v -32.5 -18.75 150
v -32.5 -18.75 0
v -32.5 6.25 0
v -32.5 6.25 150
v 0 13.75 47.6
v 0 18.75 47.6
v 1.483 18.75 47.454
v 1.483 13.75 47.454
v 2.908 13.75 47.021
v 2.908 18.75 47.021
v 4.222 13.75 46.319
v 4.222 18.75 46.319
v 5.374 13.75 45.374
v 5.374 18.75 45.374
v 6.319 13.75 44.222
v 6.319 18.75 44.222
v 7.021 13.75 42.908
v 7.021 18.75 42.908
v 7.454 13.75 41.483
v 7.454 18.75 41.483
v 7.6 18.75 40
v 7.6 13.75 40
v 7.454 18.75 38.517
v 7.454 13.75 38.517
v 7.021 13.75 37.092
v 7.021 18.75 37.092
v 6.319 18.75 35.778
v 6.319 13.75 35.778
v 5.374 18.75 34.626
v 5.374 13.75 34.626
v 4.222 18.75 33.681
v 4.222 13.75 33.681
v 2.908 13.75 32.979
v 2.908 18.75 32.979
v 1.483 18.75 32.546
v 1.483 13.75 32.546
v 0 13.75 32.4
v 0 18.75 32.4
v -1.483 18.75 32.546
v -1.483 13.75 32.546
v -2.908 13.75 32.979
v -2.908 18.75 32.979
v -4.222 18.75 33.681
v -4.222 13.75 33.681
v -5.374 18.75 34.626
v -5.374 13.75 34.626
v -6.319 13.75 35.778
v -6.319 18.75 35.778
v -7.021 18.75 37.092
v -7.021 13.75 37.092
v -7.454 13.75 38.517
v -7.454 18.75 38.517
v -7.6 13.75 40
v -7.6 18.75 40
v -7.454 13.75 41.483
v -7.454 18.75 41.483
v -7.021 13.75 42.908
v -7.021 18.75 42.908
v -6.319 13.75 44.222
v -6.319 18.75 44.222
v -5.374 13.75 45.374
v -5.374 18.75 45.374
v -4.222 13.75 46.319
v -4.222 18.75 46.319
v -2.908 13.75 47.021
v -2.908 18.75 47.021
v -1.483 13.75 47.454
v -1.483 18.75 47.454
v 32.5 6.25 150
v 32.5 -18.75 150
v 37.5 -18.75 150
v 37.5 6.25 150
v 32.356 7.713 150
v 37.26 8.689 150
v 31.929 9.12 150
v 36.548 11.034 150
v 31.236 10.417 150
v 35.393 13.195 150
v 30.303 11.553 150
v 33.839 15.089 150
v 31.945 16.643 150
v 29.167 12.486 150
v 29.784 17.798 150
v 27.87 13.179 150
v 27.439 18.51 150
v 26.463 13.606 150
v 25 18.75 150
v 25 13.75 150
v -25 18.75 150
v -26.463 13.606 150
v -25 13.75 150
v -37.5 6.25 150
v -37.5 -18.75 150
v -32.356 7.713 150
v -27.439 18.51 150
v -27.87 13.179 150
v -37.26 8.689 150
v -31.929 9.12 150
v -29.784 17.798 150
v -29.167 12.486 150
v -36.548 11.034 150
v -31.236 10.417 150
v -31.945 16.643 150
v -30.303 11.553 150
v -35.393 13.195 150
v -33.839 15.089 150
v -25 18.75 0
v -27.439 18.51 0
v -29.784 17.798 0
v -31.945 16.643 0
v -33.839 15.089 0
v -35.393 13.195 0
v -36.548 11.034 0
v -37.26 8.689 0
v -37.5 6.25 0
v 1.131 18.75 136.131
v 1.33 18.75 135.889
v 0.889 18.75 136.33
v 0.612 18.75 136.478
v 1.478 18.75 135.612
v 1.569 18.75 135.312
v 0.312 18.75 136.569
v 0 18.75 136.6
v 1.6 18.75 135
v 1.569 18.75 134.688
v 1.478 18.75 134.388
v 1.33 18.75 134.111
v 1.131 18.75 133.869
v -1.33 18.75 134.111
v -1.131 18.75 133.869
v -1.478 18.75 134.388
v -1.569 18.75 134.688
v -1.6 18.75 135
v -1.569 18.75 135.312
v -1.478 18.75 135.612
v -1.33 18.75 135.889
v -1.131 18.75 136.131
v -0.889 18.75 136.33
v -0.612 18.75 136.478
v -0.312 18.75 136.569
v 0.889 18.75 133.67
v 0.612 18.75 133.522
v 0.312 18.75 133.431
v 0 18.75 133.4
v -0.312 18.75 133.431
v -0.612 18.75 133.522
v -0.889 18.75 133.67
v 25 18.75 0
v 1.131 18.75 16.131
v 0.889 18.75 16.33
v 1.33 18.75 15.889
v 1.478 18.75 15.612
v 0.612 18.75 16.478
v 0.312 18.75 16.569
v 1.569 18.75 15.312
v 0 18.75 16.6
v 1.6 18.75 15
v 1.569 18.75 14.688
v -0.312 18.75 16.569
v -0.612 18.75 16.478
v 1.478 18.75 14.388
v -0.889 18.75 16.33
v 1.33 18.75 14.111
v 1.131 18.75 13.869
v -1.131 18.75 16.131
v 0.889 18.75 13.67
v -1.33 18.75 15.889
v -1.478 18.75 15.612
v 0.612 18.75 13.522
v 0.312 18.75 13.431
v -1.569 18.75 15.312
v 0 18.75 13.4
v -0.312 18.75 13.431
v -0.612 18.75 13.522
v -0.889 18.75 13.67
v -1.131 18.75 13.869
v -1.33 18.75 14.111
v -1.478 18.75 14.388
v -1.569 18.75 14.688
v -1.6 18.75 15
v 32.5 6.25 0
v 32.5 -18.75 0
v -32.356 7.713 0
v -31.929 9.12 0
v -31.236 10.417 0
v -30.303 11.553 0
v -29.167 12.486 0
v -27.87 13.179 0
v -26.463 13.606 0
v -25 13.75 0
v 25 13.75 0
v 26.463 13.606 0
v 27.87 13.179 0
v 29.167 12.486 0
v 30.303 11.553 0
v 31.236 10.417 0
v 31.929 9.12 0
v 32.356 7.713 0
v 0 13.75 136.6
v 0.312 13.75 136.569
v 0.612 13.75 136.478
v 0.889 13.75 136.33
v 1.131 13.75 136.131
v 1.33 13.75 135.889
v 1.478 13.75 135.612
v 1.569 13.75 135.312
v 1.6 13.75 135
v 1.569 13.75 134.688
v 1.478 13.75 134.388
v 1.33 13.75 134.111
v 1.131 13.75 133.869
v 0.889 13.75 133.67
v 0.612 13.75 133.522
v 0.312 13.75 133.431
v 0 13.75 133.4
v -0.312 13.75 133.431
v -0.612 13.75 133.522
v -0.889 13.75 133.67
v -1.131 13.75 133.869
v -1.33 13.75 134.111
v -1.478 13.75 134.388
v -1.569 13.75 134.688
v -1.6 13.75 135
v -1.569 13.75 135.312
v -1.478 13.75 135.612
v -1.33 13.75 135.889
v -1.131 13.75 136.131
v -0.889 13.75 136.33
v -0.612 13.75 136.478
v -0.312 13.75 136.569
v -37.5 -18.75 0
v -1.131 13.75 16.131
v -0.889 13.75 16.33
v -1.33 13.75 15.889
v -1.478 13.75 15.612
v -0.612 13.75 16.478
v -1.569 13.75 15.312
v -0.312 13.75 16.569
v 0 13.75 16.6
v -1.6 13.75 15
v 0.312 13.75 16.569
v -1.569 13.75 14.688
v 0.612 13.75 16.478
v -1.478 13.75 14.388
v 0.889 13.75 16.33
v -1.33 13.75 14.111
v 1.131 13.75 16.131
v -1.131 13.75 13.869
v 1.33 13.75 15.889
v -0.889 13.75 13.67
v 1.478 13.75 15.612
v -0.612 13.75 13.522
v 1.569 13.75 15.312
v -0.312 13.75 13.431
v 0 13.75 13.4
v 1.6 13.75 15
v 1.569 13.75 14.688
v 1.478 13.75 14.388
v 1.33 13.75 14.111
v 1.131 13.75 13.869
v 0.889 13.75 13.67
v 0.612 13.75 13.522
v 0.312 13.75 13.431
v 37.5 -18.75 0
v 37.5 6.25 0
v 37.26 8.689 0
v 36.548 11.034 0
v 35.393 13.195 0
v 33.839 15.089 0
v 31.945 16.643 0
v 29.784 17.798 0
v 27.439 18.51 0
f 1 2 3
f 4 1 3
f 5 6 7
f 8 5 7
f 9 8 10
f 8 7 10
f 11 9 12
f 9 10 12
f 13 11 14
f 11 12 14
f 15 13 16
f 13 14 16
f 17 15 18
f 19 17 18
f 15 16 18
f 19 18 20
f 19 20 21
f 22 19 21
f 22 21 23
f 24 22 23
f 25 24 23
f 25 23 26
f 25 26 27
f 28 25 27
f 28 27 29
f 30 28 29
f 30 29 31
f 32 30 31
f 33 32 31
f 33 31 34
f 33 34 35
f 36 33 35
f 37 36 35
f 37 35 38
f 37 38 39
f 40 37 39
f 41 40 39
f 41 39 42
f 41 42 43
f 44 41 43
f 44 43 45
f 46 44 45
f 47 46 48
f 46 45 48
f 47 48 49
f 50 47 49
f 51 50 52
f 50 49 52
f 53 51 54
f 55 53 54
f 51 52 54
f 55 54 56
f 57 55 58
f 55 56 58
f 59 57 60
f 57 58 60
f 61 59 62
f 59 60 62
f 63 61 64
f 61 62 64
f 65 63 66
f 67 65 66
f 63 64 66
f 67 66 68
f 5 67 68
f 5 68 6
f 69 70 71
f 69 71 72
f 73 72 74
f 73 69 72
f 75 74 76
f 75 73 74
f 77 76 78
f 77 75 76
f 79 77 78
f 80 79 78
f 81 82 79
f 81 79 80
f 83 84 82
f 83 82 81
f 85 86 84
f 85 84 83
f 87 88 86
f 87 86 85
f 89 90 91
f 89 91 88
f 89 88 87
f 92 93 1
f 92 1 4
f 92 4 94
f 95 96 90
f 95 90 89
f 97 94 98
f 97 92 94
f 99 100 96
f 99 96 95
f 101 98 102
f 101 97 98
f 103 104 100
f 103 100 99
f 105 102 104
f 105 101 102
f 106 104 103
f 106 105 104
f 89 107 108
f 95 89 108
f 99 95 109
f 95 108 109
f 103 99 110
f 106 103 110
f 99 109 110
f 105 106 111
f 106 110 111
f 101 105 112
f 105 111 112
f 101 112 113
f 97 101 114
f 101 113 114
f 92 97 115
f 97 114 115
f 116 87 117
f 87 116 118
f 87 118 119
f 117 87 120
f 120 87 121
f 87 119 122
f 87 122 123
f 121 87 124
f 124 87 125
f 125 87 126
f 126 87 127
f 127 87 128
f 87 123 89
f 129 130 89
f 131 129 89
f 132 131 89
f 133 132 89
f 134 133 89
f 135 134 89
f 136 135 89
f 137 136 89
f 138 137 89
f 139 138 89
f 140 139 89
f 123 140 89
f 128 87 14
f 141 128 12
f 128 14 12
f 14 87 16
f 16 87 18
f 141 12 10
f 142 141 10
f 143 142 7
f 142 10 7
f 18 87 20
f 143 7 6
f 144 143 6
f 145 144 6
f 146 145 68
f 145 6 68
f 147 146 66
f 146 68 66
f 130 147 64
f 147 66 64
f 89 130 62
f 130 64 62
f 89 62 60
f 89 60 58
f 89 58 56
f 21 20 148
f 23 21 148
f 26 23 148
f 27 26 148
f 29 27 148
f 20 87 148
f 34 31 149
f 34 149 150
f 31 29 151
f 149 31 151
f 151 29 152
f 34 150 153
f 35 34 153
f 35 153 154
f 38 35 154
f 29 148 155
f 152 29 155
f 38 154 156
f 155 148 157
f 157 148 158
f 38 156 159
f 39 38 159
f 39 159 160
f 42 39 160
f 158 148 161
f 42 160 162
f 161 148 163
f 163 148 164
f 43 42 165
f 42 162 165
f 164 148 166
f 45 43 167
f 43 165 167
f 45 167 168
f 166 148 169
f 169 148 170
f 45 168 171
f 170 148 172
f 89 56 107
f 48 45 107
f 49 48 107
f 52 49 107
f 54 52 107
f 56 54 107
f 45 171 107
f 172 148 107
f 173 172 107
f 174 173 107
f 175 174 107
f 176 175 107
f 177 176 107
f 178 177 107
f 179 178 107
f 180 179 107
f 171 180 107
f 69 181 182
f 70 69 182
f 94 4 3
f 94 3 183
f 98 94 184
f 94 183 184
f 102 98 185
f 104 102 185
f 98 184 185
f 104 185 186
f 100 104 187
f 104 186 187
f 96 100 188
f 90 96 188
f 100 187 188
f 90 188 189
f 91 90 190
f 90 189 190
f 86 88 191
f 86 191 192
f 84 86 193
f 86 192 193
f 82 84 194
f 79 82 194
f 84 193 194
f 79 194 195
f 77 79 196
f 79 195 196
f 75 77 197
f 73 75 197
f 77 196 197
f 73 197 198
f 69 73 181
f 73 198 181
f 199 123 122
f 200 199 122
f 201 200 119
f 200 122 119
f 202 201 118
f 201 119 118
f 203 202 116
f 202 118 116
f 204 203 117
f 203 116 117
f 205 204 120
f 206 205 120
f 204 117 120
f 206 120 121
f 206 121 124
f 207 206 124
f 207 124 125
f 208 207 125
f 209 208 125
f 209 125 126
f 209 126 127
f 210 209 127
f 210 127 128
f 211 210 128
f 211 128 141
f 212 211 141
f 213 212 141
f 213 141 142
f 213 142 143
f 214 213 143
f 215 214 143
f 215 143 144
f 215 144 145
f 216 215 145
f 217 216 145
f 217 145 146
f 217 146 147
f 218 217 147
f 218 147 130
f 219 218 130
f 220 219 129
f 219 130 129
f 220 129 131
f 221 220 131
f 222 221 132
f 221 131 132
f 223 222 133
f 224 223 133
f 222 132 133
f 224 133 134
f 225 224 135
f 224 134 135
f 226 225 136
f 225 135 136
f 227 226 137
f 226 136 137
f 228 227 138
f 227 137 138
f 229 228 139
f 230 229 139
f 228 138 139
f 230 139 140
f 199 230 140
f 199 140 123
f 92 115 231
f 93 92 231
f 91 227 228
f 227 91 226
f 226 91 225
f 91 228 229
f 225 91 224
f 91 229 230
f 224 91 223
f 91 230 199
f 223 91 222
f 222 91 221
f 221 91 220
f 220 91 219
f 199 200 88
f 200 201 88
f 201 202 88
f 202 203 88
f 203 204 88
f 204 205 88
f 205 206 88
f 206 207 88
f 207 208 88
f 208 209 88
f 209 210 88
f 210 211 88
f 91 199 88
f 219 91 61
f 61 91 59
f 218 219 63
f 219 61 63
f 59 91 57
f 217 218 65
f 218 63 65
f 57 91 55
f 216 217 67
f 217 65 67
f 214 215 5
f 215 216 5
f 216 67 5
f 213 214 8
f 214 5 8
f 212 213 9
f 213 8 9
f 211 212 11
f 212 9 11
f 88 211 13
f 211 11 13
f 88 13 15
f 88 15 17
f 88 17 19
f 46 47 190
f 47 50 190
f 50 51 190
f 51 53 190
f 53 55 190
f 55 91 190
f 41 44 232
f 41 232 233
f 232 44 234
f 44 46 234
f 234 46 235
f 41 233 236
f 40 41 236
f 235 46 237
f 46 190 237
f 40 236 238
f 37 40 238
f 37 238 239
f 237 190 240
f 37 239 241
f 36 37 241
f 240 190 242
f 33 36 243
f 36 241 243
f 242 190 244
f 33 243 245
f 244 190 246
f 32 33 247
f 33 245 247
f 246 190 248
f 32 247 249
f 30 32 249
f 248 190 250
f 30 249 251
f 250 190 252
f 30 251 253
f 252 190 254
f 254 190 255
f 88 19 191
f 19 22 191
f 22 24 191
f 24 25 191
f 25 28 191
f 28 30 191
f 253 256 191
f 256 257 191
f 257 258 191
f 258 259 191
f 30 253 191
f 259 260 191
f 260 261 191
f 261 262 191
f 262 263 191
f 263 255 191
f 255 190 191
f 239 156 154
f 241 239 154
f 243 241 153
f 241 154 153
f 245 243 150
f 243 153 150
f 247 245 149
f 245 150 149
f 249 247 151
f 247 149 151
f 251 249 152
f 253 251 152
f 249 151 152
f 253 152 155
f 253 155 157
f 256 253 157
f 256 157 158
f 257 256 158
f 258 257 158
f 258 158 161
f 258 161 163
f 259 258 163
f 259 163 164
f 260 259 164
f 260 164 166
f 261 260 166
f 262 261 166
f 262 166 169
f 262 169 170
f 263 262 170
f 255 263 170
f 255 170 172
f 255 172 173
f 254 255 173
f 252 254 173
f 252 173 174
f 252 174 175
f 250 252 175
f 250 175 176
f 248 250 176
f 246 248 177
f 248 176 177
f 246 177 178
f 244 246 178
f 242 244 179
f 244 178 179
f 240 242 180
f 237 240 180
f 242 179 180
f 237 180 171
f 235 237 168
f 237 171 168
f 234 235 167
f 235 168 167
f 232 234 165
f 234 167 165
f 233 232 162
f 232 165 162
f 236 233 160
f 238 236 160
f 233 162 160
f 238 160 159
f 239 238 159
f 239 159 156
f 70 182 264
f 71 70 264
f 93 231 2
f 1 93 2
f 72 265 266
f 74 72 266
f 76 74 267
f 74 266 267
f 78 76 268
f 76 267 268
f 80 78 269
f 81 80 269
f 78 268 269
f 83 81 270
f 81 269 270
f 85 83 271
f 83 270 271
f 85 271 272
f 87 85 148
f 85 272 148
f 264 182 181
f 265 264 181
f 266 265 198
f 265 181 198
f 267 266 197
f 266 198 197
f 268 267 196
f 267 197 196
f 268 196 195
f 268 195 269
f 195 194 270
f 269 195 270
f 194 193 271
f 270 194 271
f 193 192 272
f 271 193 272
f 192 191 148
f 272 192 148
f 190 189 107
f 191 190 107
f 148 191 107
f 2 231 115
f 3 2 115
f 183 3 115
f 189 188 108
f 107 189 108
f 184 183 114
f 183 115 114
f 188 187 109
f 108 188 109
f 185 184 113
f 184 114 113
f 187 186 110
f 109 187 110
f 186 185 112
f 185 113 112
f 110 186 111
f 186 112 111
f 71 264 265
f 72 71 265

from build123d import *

# Parameters (mm, degrees)
BOSS_EXTRUDE1_DEPTH = 150
SKETCH2_R           = 1.6
CUT_EXTRUDE1_DEPTH  = 160.099025767
SKETCH4_R           = 7.6
CUT_EXTRUDE2_DEPTH  = 160.099025767


with BuildPart() as part:
    # Sketch1 → Boss-Extrude1 (new body)
    with BuildSketch(Plane(origin=(0, 0, 0), x_dir=(0, 1, 0), z_dir=(0, 0, 1))):
        with BuildLine():
            Line((-18.75, 37.5), (-18.75, 32.5))
            Line((-18.75, 32.5), (6.25, 32.5))
            ThreePointArc((6.25, 32.5), (11.553300859, 30.303300859), (13.75, 25))
            Line((13.75, 25), (13.75, -25))
            ThreePointArc((13.75, -25), (11.553300859, -30.303300859), (6.25, -32.5))
            Line((6.25, -32.5), (-18.75, -32.5))
            Line((-18.75, -32.5), (-18.75, -37.5))
            Line((-18.75, -37.5), (6.25, -37.5))
            ThreePointArc((6.25, -37.5), (15.088834765, -33.838834765), (18.75, -25))
            Line((18.75, -25), (18.75, 25))
            ThreePointArc((18.75, 25), (15.088834765, 33.838834765), (6.25, 37.5))
            Line((6.25, 37.5), (-18.75, 37.5))
        make_face()
    extrude(amount=BOSS_EXTRUDE1_DEPTH)

    # Sketch2 → Cut-Extrude1 (cut, through all)
    with BuildSketch(Plane(origin=(0, 18.75, 0), x_dir=(-1, 0, 0), z_dir=(0, 1, 0))):
        with Locations(Location((0, 135, 0), (0, 0, 90))):
            Circle(SKETCH2_R)
        with Locations(Location((0, 15, 0), (0, 0, 90))):
            Circle(SKETCH2_R)
    extrude(amount=-CUT_EXTRUDE1_DEPTH, mode=Mode.SUBTRACT)

    # Sketch4 → Cut-Extrude2 (cut, through all)
    with BuildSketch(Plane(origin=(0, 18.75, 0), x_dir=(-1, 0, 0), z_dir=(0, 1, 0))):
        with Locations(Location((0, 40, 0), (0, 0, 90))):
            Circle(SKETCH4_R)
    extrude(amount=-CUT_EXTRUDE2_DEPTH, mode=Mode.SUBTRACT)


solid = part.part
